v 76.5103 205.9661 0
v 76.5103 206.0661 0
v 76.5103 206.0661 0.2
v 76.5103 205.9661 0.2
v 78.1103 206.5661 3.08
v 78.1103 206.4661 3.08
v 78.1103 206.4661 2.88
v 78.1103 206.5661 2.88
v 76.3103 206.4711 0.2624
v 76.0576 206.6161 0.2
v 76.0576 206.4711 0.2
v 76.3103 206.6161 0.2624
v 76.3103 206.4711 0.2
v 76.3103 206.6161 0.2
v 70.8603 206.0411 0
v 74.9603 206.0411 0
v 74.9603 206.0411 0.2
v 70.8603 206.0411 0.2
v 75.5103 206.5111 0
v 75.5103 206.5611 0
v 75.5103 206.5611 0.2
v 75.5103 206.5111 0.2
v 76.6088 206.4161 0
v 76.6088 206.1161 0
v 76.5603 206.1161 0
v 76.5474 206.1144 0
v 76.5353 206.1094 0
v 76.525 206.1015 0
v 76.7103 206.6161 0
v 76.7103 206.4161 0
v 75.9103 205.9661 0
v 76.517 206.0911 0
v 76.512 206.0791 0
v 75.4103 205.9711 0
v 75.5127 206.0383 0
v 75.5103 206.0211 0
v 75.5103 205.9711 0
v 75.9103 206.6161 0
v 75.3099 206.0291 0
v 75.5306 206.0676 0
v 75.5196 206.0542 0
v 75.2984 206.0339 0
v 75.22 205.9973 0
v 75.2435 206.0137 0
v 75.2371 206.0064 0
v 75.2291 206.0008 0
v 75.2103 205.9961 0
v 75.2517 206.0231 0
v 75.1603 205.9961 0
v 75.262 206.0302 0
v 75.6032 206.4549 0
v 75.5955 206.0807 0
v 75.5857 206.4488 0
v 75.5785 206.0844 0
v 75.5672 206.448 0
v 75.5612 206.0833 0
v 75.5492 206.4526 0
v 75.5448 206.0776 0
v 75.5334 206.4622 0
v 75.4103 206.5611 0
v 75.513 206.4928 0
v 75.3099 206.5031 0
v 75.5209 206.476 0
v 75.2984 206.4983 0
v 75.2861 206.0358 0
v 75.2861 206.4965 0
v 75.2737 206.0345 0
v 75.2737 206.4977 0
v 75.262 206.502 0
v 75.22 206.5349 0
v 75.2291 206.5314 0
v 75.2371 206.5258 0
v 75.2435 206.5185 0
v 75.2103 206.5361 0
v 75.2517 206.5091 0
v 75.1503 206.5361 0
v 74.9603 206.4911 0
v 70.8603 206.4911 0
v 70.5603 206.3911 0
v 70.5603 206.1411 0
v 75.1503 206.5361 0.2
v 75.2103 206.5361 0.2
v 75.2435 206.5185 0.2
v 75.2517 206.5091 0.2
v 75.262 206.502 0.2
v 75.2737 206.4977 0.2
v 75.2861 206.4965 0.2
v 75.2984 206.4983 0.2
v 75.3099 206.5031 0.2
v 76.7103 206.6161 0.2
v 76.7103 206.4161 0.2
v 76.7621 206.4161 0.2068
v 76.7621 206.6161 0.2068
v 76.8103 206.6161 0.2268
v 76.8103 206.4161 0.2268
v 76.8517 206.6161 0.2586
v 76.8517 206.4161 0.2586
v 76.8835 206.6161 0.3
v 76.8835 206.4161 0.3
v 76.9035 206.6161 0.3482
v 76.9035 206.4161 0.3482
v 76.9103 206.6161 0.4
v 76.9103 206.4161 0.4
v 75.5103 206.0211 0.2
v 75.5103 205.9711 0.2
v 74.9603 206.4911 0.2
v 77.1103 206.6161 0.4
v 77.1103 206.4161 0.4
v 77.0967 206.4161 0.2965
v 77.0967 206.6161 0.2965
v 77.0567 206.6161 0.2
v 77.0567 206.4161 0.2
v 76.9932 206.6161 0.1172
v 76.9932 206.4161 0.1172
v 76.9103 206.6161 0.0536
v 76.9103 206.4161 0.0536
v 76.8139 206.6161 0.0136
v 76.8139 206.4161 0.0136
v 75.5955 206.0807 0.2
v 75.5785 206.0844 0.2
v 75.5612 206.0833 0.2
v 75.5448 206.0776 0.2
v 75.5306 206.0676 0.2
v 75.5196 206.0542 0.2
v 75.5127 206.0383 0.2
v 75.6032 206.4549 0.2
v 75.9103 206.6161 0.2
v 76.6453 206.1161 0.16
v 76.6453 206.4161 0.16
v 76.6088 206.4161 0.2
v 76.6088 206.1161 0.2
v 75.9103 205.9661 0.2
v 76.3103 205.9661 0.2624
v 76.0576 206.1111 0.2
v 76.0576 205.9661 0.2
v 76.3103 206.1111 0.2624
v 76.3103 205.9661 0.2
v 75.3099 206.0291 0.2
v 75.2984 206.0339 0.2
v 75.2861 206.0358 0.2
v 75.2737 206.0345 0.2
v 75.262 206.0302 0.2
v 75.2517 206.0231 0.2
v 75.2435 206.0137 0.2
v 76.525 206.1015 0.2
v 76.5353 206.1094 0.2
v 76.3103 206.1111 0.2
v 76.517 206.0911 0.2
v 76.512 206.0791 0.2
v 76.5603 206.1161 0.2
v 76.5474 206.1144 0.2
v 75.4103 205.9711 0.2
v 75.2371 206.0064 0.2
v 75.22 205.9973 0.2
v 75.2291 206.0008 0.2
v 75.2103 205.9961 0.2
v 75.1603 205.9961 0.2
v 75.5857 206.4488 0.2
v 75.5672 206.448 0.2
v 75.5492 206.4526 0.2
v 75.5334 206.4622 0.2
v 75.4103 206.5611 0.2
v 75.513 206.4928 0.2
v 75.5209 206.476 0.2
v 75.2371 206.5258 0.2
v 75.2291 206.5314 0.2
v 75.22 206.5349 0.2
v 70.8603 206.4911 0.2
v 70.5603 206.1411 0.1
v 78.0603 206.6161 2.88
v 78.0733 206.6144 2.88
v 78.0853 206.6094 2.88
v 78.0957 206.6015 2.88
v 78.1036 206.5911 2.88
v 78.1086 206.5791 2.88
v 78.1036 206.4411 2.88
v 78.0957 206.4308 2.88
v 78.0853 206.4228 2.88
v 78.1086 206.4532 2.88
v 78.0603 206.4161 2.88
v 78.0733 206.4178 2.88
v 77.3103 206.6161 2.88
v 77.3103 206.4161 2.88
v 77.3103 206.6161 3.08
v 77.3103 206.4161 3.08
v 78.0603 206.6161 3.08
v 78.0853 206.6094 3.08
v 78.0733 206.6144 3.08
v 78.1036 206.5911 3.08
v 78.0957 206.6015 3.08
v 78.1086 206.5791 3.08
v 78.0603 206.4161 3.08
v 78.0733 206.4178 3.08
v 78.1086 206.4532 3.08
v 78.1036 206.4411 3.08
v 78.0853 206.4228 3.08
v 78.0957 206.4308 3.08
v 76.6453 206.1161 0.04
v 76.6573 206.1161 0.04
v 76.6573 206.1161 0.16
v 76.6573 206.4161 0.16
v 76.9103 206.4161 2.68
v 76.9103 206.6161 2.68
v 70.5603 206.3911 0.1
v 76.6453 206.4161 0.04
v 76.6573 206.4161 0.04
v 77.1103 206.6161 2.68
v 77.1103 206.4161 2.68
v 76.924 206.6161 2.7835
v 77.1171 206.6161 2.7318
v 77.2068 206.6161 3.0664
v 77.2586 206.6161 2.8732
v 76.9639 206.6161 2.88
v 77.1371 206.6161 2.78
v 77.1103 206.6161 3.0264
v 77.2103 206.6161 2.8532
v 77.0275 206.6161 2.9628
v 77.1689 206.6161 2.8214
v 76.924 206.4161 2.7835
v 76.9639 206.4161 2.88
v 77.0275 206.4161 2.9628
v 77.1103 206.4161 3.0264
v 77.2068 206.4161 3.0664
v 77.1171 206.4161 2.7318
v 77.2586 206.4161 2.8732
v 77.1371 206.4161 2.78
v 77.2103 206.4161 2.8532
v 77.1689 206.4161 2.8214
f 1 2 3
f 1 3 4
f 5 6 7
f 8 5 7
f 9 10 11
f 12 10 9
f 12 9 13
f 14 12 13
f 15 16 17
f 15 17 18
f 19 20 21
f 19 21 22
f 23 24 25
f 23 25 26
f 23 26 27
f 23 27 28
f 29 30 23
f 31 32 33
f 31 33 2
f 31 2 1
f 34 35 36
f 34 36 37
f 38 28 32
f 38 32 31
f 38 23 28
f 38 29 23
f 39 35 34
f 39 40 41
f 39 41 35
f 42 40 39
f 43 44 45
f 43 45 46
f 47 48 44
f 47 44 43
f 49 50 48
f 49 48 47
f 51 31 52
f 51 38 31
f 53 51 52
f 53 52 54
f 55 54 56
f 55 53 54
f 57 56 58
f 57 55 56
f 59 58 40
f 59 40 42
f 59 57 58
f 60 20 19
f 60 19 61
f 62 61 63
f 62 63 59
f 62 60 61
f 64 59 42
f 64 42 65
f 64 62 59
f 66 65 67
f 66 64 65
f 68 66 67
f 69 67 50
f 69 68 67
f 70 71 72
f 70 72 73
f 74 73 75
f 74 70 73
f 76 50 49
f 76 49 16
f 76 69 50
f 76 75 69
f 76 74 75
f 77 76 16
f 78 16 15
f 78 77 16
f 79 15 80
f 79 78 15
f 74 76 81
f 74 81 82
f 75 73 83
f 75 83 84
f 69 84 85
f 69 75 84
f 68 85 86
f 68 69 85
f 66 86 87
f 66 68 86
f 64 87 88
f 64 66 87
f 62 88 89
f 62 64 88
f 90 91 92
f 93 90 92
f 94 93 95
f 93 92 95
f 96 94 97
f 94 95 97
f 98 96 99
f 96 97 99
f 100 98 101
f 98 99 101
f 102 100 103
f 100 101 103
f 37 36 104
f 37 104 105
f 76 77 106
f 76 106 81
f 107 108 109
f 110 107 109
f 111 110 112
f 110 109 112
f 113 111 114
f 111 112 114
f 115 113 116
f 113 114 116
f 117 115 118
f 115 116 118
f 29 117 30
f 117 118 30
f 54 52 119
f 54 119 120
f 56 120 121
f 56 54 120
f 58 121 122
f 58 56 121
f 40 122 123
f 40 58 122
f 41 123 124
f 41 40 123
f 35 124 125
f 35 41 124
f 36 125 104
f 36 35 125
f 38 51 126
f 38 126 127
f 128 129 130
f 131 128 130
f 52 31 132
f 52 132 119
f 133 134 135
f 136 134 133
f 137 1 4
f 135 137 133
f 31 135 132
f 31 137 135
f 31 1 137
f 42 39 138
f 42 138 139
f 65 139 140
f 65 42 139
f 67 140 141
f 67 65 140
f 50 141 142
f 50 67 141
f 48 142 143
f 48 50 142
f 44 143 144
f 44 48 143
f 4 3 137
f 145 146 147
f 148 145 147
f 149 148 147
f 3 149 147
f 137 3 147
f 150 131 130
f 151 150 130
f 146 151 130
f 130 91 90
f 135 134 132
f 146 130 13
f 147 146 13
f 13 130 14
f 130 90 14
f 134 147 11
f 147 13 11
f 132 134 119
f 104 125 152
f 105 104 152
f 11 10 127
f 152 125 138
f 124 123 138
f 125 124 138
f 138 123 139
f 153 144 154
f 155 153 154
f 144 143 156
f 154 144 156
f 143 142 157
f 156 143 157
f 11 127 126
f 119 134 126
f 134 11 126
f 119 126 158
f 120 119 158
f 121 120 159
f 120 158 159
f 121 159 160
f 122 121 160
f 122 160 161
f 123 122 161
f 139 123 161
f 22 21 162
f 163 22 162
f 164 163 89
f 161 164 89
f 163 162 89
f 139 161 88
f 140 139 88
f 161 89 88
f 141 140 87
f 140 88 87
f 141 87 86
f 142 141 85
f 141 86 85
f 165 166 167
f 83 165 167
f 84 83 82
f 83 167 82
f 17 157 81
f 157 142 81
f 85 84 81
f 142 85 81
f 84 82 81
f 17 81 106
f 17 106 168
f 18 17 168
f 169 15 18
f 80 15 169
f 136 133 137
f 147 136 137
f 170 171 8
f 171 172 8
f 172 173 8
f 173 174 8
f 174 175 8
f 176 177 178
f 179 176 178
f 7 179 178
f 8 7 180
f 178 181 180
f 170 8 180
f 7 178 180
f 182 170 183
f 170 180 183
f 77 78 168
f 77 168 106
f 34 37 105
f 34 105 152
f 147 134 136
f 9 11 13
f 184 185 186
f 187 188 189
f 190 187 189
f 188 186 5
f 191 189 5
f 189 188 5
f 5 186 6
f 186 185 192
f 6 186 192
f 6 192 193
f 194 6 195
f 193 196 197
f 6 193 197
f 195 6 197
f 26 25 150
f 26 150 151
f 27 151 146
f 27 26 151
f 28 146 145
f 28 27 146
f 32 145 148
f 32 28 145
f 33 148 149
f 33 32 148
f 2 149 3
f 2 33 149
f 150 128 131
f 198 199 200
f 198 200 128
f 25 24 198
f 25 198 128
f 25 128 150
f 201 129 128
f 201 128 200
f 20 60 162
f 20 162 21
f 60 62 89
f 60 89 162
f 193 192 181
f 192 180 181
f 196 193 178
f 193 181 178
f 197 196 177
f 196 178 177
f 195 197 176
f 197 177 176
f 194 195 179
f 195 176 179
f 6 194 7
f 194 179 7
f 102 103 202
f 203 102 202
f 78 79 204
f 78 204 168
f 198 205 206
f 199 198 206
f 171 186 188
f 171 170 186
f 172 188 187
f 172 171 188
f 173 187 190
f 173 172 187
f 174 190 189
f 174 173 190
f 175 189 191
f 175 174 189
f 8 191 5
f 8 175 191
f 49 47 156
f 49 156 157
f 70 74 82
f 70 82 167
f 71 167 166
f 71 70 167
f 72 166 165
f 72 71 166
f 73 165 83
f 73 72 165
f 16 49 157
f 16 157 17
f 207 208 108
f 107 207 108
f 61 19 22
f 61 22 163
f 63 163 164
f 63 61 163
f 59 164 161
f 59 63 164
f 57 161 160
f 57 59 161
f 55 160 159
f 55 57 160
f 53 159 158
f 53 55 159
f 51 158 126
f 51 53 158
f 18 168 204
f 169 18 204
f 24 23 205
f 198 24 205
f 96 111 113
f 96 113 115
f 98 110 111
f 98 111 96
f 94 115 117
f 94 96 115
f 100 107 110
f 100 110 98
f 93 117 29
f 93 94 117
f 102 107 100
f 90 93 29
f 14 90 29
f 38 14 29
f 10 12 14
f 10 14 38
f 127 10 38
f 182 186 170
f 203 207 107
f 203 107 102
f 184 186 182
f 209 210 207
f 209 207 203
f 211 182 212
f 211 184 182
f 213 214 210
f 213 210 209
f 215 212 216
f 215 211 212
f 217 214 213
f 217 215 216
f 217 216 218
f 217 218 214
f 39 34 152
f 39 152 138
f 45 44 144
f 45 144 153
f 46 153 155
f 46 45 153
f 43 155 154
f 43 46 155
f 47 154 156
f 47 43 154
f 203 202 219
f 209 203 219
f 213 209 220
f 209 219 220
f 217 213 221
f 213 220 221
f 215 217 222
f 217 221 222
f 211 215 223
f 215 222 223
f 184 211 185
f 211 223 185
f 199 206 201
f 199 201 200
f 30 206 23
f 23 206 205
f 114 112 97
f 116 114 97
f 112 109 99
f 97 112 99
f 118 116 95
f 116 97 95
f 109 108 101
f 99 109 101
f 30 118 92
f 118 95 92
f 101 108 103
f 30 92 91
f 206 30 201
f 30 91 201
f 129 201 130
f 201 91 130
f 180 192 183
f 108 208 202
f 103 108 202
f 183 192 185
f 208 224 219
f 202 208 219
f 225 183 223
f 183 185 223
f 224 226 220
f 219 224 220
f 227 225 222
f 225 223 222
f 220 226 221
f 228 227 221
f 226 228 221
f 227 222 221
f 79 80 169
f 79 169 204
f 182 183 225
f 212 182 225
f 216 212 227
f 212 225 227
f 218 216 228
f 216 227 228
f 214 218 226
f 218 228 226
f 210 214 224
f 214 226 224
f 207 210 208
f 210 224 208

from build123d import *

# Parameters (mm, degrees)
RESSALTO_EXTRUS_O1_DEPTH = 0.2
RESSALTO_EXTRUS_O2_DEPTH = 0.2
CORTE_EXTRUS_O1_DEPTH    = 1
FILETE1_R                = 0.05
RESSALTO_EXTRUS_O3_DEPTH = 0.145
PADR_O_LINEAR1_COUNT     = 2
PADR_O_LINEAR1_PITCH     = 0.505
CORTE_EXTRUS_O2_DEPTH    = 0.3


with BuildPart() as part:
    # Esboço1 → Ressalto-extrusão1 (new body)
    with BuildSketch(Plane.XY):
        with BuildLine():
            Line((76.710328142, 206.616112347), (76.710328142, 206.416112347))
            Line((76.710328142, 206.416112347), (76.657349848, 206.416112347))
            Line((76.657349848, 206.416112347), (76.657349848, 206.116112347))
            Line((76.657349848, 206.116112347), (76.645328142, 206.116112347))
            Line((76.645328142, 206.116112347), (76.610328142, 206.116112347))
            Line((76.610328142, 206.116112347), (76.560328142, 206.116112347))
            ThreePointArc((76.560328142, 206.116112347), (76.524972803, 206.101467686), (76.510328142, 206.066112347))
            Line((76.510328142, 206.066112347), (76.510328142, 205.966112347))
            Line((76.510328142, 205.966112347), (76.110328142, 205.966112347))
            Line((76.110328142, 205.966112347), (76.081970009, 205.966112347))
            Line((76.081970009, 205.966112347), (75.910328142, 205.966112347))
            Line((75.910328142, 205.966112347), (75.595453106, 206.080717488))
            ThreePointArc((75.595453106, 206.080717488), (75.537376388, 206.073071543), (75.510328142, 206.021112347))
            Line((75.510328142, 206.021112347), (75.510328142, 205.971112347))
            Line((75.510328142, 205.971112347), (75.410328142, 205.971112347))
            Line((75.410328142, 205.971112347), (75.309933917, 206.02907498))
            ThreePointArc((75.309933917, 206.02907498), (75.273690046, 206.034493063), (75.243486264, 206.013739619))
            ThreePointArc((75.243486264, 206.013739619), (75.229104336, 206.000793024), (75.210328142, 205.996112347))
            Line((75.210328142, 205.996112347), (75.160328142, 205.996112347))
            Line((75.160328142, 205.996112347), (74.960328142, 206.041112347))
            Line((74.960328142, 206.041112347), (70.860328142, 206.041112347))
            Line((70.860328142, 206.041112347), (70.560328142, 206.141112347))
            Line((70.560328142, 206.141112347), (70.560328142, 206.391112347))
            Line((70.560328142, 206.391112347), (70.860328142, 206.491112347))
            Line((70.860328142, 206.491112347), (74.960328142, 206.491112347))
            Line((74.960328142, 206.491112347), (75.150344741, 206.536112347))
            Line((75.150344741, 206.536112347), (75.210328142, 206.536112347))
            ThreePointArc((75.210328142, 206.536112347), (75.229104336, 206.53143167), (75.243486264, 206.518485075))
            ThreePointArc((75.243486264, 206.518485075), (75.273690046, 206.497731631), (75.309933917, 206.503149714))
            Line((75.309933917, 206.503149714), (75.410328142, 206.561112347))
            Line((75.410328142, 206.561112347), (75.510328142, 206.561112347))
            Line((75.510328142, 206.561112347), (75.510328142, 206.511112347))
            ThreePointArc((75.510328142, 206.511112347), (75.540942979, 206.456830135), (75.60323487, 206.454946752))
            Line((75.60323487, 206.454946752), (75.910328142, 206.616112347))
            Line((75.910328142, 206.616112347), (76.081970009, 206.616112347))
            Line((76.081970009, 206.616112347), (76.110328142, 206.616112347))
            Line((76.110328142, 206.616112347), (76.710328142, 206.616112347))
        make_face()
    extrude(amount=RESSALTO_EXTRUS_O1_DEPTH)

    # Esboço2 → Ressalto-extrusão2 (add)
    with BuildSketch(Plane.XZ.offset(-206.416112347)):
        with BuildLine():
            Line((76.710328142, 0), (76.710328142, 0.2))
            ThreePointArc((76.710328142, 0.2), (76.851749499, 0.258578644), (76.910328142, 0.4))
            Line((76.910328142, 0.4), (76.910328142, 2.68))
            ThreePointArc((76.910328142, 2.68), (77.02748543, 2.962842712), (77.310328142, 3.08))
            Line((77.310328142, 3.08), (78.110328142, 3.08))
            Line((78.110328142, 3.08), (78.110328142, 2.88))
            Line((78.110328142, 2.88), (77.310328142, 2.88))
            ThreePointArc((77.310328142, 2.88), (77.168906786, 2.821421356), (77.110328142, 2.68))
            Line((77.110328142, 2.68), (77.110328142, 0.4))
            ThreePointArc((77.110328142, 0.4), (76.993170855, 0.117157288), (76.710328142, 0))
        make_face()
    extrude(amount=-RESSALTO_EXTRUS_O2_DEPTH)

    # Esboço3 → Corte-extrusão1 (cut)
    with BuildSketch(Plane(origin=(0, 206.491112347, 0), x_dir=(1, 0, 0), z_dir=(0, 1, 0))):
        Polygon((70.560328142, -0.1), (70.475949981, -0.1), (70.475949981, -0.288700335), (70.860328142, -0.288700335), (70.860328142, -0.2), align=None)
    extrude(amount=-CORTE_EXTRUS_O1_DEPTH, mode=Mode.SUBTRACT)

    # Filete1
    filete1_edges = [part.edges().sort_by_distance(p)[0] for p in [
        (78.110328142, 206.616112347, 2.98),
        (78.110328142, 206.416112347, 2.98),
    ]]
    fillet(filete1_edges, radius=FILETE1_R)

    # Esboço4 → Ressalto-extrusão3 (add)
    with BuildSketch(Plane(origin=(0, 206.616112347, 0), x_dir=(1, 0, 0), z_dir=(0, 1, 0))):
        Polygon((76.057628142, -0.2), (76.310328142, -0.2624), (76.310328142, -0.2), align=None)
    ressalto_extrus_o3 = extrude(amount=-RESSALTO_EXTRUS_O3_DEPTH)

    # Padrão linear1: Ressalto-extrusão3 ×2
    with Locations(*[(0, -i * PADR_O_LINEAR1_PITCH, 0) for i in range(1, PADR_O_LINEAR1_COUNT)]):
        add(ressalto_extrus_o3)

    # Esboço5 → Corte-extrusão2 (cut)
    with BuildSketch(Plane.XZ.offset(-206.116112347)):
        Polygon((76.657349848, 0.16), (76.645349848, 0.16), (76.608838995, 0.2), (76.608838995, 0.232444762), (76.679680574, 0.232444762), (76.679680574, 0.16), align=None)
        Polygon((76.608838995, 0), (76.645349848, 0.04), (76.679680574, 0.04), (76.679680574, -0.014078239), (76.608838995, -0.014078239), align=None)
    extrude(amount=-CORTE_EXTRUS_O2_DEPTH, mode=Mode.SUBTRACT)


solid = part.part
